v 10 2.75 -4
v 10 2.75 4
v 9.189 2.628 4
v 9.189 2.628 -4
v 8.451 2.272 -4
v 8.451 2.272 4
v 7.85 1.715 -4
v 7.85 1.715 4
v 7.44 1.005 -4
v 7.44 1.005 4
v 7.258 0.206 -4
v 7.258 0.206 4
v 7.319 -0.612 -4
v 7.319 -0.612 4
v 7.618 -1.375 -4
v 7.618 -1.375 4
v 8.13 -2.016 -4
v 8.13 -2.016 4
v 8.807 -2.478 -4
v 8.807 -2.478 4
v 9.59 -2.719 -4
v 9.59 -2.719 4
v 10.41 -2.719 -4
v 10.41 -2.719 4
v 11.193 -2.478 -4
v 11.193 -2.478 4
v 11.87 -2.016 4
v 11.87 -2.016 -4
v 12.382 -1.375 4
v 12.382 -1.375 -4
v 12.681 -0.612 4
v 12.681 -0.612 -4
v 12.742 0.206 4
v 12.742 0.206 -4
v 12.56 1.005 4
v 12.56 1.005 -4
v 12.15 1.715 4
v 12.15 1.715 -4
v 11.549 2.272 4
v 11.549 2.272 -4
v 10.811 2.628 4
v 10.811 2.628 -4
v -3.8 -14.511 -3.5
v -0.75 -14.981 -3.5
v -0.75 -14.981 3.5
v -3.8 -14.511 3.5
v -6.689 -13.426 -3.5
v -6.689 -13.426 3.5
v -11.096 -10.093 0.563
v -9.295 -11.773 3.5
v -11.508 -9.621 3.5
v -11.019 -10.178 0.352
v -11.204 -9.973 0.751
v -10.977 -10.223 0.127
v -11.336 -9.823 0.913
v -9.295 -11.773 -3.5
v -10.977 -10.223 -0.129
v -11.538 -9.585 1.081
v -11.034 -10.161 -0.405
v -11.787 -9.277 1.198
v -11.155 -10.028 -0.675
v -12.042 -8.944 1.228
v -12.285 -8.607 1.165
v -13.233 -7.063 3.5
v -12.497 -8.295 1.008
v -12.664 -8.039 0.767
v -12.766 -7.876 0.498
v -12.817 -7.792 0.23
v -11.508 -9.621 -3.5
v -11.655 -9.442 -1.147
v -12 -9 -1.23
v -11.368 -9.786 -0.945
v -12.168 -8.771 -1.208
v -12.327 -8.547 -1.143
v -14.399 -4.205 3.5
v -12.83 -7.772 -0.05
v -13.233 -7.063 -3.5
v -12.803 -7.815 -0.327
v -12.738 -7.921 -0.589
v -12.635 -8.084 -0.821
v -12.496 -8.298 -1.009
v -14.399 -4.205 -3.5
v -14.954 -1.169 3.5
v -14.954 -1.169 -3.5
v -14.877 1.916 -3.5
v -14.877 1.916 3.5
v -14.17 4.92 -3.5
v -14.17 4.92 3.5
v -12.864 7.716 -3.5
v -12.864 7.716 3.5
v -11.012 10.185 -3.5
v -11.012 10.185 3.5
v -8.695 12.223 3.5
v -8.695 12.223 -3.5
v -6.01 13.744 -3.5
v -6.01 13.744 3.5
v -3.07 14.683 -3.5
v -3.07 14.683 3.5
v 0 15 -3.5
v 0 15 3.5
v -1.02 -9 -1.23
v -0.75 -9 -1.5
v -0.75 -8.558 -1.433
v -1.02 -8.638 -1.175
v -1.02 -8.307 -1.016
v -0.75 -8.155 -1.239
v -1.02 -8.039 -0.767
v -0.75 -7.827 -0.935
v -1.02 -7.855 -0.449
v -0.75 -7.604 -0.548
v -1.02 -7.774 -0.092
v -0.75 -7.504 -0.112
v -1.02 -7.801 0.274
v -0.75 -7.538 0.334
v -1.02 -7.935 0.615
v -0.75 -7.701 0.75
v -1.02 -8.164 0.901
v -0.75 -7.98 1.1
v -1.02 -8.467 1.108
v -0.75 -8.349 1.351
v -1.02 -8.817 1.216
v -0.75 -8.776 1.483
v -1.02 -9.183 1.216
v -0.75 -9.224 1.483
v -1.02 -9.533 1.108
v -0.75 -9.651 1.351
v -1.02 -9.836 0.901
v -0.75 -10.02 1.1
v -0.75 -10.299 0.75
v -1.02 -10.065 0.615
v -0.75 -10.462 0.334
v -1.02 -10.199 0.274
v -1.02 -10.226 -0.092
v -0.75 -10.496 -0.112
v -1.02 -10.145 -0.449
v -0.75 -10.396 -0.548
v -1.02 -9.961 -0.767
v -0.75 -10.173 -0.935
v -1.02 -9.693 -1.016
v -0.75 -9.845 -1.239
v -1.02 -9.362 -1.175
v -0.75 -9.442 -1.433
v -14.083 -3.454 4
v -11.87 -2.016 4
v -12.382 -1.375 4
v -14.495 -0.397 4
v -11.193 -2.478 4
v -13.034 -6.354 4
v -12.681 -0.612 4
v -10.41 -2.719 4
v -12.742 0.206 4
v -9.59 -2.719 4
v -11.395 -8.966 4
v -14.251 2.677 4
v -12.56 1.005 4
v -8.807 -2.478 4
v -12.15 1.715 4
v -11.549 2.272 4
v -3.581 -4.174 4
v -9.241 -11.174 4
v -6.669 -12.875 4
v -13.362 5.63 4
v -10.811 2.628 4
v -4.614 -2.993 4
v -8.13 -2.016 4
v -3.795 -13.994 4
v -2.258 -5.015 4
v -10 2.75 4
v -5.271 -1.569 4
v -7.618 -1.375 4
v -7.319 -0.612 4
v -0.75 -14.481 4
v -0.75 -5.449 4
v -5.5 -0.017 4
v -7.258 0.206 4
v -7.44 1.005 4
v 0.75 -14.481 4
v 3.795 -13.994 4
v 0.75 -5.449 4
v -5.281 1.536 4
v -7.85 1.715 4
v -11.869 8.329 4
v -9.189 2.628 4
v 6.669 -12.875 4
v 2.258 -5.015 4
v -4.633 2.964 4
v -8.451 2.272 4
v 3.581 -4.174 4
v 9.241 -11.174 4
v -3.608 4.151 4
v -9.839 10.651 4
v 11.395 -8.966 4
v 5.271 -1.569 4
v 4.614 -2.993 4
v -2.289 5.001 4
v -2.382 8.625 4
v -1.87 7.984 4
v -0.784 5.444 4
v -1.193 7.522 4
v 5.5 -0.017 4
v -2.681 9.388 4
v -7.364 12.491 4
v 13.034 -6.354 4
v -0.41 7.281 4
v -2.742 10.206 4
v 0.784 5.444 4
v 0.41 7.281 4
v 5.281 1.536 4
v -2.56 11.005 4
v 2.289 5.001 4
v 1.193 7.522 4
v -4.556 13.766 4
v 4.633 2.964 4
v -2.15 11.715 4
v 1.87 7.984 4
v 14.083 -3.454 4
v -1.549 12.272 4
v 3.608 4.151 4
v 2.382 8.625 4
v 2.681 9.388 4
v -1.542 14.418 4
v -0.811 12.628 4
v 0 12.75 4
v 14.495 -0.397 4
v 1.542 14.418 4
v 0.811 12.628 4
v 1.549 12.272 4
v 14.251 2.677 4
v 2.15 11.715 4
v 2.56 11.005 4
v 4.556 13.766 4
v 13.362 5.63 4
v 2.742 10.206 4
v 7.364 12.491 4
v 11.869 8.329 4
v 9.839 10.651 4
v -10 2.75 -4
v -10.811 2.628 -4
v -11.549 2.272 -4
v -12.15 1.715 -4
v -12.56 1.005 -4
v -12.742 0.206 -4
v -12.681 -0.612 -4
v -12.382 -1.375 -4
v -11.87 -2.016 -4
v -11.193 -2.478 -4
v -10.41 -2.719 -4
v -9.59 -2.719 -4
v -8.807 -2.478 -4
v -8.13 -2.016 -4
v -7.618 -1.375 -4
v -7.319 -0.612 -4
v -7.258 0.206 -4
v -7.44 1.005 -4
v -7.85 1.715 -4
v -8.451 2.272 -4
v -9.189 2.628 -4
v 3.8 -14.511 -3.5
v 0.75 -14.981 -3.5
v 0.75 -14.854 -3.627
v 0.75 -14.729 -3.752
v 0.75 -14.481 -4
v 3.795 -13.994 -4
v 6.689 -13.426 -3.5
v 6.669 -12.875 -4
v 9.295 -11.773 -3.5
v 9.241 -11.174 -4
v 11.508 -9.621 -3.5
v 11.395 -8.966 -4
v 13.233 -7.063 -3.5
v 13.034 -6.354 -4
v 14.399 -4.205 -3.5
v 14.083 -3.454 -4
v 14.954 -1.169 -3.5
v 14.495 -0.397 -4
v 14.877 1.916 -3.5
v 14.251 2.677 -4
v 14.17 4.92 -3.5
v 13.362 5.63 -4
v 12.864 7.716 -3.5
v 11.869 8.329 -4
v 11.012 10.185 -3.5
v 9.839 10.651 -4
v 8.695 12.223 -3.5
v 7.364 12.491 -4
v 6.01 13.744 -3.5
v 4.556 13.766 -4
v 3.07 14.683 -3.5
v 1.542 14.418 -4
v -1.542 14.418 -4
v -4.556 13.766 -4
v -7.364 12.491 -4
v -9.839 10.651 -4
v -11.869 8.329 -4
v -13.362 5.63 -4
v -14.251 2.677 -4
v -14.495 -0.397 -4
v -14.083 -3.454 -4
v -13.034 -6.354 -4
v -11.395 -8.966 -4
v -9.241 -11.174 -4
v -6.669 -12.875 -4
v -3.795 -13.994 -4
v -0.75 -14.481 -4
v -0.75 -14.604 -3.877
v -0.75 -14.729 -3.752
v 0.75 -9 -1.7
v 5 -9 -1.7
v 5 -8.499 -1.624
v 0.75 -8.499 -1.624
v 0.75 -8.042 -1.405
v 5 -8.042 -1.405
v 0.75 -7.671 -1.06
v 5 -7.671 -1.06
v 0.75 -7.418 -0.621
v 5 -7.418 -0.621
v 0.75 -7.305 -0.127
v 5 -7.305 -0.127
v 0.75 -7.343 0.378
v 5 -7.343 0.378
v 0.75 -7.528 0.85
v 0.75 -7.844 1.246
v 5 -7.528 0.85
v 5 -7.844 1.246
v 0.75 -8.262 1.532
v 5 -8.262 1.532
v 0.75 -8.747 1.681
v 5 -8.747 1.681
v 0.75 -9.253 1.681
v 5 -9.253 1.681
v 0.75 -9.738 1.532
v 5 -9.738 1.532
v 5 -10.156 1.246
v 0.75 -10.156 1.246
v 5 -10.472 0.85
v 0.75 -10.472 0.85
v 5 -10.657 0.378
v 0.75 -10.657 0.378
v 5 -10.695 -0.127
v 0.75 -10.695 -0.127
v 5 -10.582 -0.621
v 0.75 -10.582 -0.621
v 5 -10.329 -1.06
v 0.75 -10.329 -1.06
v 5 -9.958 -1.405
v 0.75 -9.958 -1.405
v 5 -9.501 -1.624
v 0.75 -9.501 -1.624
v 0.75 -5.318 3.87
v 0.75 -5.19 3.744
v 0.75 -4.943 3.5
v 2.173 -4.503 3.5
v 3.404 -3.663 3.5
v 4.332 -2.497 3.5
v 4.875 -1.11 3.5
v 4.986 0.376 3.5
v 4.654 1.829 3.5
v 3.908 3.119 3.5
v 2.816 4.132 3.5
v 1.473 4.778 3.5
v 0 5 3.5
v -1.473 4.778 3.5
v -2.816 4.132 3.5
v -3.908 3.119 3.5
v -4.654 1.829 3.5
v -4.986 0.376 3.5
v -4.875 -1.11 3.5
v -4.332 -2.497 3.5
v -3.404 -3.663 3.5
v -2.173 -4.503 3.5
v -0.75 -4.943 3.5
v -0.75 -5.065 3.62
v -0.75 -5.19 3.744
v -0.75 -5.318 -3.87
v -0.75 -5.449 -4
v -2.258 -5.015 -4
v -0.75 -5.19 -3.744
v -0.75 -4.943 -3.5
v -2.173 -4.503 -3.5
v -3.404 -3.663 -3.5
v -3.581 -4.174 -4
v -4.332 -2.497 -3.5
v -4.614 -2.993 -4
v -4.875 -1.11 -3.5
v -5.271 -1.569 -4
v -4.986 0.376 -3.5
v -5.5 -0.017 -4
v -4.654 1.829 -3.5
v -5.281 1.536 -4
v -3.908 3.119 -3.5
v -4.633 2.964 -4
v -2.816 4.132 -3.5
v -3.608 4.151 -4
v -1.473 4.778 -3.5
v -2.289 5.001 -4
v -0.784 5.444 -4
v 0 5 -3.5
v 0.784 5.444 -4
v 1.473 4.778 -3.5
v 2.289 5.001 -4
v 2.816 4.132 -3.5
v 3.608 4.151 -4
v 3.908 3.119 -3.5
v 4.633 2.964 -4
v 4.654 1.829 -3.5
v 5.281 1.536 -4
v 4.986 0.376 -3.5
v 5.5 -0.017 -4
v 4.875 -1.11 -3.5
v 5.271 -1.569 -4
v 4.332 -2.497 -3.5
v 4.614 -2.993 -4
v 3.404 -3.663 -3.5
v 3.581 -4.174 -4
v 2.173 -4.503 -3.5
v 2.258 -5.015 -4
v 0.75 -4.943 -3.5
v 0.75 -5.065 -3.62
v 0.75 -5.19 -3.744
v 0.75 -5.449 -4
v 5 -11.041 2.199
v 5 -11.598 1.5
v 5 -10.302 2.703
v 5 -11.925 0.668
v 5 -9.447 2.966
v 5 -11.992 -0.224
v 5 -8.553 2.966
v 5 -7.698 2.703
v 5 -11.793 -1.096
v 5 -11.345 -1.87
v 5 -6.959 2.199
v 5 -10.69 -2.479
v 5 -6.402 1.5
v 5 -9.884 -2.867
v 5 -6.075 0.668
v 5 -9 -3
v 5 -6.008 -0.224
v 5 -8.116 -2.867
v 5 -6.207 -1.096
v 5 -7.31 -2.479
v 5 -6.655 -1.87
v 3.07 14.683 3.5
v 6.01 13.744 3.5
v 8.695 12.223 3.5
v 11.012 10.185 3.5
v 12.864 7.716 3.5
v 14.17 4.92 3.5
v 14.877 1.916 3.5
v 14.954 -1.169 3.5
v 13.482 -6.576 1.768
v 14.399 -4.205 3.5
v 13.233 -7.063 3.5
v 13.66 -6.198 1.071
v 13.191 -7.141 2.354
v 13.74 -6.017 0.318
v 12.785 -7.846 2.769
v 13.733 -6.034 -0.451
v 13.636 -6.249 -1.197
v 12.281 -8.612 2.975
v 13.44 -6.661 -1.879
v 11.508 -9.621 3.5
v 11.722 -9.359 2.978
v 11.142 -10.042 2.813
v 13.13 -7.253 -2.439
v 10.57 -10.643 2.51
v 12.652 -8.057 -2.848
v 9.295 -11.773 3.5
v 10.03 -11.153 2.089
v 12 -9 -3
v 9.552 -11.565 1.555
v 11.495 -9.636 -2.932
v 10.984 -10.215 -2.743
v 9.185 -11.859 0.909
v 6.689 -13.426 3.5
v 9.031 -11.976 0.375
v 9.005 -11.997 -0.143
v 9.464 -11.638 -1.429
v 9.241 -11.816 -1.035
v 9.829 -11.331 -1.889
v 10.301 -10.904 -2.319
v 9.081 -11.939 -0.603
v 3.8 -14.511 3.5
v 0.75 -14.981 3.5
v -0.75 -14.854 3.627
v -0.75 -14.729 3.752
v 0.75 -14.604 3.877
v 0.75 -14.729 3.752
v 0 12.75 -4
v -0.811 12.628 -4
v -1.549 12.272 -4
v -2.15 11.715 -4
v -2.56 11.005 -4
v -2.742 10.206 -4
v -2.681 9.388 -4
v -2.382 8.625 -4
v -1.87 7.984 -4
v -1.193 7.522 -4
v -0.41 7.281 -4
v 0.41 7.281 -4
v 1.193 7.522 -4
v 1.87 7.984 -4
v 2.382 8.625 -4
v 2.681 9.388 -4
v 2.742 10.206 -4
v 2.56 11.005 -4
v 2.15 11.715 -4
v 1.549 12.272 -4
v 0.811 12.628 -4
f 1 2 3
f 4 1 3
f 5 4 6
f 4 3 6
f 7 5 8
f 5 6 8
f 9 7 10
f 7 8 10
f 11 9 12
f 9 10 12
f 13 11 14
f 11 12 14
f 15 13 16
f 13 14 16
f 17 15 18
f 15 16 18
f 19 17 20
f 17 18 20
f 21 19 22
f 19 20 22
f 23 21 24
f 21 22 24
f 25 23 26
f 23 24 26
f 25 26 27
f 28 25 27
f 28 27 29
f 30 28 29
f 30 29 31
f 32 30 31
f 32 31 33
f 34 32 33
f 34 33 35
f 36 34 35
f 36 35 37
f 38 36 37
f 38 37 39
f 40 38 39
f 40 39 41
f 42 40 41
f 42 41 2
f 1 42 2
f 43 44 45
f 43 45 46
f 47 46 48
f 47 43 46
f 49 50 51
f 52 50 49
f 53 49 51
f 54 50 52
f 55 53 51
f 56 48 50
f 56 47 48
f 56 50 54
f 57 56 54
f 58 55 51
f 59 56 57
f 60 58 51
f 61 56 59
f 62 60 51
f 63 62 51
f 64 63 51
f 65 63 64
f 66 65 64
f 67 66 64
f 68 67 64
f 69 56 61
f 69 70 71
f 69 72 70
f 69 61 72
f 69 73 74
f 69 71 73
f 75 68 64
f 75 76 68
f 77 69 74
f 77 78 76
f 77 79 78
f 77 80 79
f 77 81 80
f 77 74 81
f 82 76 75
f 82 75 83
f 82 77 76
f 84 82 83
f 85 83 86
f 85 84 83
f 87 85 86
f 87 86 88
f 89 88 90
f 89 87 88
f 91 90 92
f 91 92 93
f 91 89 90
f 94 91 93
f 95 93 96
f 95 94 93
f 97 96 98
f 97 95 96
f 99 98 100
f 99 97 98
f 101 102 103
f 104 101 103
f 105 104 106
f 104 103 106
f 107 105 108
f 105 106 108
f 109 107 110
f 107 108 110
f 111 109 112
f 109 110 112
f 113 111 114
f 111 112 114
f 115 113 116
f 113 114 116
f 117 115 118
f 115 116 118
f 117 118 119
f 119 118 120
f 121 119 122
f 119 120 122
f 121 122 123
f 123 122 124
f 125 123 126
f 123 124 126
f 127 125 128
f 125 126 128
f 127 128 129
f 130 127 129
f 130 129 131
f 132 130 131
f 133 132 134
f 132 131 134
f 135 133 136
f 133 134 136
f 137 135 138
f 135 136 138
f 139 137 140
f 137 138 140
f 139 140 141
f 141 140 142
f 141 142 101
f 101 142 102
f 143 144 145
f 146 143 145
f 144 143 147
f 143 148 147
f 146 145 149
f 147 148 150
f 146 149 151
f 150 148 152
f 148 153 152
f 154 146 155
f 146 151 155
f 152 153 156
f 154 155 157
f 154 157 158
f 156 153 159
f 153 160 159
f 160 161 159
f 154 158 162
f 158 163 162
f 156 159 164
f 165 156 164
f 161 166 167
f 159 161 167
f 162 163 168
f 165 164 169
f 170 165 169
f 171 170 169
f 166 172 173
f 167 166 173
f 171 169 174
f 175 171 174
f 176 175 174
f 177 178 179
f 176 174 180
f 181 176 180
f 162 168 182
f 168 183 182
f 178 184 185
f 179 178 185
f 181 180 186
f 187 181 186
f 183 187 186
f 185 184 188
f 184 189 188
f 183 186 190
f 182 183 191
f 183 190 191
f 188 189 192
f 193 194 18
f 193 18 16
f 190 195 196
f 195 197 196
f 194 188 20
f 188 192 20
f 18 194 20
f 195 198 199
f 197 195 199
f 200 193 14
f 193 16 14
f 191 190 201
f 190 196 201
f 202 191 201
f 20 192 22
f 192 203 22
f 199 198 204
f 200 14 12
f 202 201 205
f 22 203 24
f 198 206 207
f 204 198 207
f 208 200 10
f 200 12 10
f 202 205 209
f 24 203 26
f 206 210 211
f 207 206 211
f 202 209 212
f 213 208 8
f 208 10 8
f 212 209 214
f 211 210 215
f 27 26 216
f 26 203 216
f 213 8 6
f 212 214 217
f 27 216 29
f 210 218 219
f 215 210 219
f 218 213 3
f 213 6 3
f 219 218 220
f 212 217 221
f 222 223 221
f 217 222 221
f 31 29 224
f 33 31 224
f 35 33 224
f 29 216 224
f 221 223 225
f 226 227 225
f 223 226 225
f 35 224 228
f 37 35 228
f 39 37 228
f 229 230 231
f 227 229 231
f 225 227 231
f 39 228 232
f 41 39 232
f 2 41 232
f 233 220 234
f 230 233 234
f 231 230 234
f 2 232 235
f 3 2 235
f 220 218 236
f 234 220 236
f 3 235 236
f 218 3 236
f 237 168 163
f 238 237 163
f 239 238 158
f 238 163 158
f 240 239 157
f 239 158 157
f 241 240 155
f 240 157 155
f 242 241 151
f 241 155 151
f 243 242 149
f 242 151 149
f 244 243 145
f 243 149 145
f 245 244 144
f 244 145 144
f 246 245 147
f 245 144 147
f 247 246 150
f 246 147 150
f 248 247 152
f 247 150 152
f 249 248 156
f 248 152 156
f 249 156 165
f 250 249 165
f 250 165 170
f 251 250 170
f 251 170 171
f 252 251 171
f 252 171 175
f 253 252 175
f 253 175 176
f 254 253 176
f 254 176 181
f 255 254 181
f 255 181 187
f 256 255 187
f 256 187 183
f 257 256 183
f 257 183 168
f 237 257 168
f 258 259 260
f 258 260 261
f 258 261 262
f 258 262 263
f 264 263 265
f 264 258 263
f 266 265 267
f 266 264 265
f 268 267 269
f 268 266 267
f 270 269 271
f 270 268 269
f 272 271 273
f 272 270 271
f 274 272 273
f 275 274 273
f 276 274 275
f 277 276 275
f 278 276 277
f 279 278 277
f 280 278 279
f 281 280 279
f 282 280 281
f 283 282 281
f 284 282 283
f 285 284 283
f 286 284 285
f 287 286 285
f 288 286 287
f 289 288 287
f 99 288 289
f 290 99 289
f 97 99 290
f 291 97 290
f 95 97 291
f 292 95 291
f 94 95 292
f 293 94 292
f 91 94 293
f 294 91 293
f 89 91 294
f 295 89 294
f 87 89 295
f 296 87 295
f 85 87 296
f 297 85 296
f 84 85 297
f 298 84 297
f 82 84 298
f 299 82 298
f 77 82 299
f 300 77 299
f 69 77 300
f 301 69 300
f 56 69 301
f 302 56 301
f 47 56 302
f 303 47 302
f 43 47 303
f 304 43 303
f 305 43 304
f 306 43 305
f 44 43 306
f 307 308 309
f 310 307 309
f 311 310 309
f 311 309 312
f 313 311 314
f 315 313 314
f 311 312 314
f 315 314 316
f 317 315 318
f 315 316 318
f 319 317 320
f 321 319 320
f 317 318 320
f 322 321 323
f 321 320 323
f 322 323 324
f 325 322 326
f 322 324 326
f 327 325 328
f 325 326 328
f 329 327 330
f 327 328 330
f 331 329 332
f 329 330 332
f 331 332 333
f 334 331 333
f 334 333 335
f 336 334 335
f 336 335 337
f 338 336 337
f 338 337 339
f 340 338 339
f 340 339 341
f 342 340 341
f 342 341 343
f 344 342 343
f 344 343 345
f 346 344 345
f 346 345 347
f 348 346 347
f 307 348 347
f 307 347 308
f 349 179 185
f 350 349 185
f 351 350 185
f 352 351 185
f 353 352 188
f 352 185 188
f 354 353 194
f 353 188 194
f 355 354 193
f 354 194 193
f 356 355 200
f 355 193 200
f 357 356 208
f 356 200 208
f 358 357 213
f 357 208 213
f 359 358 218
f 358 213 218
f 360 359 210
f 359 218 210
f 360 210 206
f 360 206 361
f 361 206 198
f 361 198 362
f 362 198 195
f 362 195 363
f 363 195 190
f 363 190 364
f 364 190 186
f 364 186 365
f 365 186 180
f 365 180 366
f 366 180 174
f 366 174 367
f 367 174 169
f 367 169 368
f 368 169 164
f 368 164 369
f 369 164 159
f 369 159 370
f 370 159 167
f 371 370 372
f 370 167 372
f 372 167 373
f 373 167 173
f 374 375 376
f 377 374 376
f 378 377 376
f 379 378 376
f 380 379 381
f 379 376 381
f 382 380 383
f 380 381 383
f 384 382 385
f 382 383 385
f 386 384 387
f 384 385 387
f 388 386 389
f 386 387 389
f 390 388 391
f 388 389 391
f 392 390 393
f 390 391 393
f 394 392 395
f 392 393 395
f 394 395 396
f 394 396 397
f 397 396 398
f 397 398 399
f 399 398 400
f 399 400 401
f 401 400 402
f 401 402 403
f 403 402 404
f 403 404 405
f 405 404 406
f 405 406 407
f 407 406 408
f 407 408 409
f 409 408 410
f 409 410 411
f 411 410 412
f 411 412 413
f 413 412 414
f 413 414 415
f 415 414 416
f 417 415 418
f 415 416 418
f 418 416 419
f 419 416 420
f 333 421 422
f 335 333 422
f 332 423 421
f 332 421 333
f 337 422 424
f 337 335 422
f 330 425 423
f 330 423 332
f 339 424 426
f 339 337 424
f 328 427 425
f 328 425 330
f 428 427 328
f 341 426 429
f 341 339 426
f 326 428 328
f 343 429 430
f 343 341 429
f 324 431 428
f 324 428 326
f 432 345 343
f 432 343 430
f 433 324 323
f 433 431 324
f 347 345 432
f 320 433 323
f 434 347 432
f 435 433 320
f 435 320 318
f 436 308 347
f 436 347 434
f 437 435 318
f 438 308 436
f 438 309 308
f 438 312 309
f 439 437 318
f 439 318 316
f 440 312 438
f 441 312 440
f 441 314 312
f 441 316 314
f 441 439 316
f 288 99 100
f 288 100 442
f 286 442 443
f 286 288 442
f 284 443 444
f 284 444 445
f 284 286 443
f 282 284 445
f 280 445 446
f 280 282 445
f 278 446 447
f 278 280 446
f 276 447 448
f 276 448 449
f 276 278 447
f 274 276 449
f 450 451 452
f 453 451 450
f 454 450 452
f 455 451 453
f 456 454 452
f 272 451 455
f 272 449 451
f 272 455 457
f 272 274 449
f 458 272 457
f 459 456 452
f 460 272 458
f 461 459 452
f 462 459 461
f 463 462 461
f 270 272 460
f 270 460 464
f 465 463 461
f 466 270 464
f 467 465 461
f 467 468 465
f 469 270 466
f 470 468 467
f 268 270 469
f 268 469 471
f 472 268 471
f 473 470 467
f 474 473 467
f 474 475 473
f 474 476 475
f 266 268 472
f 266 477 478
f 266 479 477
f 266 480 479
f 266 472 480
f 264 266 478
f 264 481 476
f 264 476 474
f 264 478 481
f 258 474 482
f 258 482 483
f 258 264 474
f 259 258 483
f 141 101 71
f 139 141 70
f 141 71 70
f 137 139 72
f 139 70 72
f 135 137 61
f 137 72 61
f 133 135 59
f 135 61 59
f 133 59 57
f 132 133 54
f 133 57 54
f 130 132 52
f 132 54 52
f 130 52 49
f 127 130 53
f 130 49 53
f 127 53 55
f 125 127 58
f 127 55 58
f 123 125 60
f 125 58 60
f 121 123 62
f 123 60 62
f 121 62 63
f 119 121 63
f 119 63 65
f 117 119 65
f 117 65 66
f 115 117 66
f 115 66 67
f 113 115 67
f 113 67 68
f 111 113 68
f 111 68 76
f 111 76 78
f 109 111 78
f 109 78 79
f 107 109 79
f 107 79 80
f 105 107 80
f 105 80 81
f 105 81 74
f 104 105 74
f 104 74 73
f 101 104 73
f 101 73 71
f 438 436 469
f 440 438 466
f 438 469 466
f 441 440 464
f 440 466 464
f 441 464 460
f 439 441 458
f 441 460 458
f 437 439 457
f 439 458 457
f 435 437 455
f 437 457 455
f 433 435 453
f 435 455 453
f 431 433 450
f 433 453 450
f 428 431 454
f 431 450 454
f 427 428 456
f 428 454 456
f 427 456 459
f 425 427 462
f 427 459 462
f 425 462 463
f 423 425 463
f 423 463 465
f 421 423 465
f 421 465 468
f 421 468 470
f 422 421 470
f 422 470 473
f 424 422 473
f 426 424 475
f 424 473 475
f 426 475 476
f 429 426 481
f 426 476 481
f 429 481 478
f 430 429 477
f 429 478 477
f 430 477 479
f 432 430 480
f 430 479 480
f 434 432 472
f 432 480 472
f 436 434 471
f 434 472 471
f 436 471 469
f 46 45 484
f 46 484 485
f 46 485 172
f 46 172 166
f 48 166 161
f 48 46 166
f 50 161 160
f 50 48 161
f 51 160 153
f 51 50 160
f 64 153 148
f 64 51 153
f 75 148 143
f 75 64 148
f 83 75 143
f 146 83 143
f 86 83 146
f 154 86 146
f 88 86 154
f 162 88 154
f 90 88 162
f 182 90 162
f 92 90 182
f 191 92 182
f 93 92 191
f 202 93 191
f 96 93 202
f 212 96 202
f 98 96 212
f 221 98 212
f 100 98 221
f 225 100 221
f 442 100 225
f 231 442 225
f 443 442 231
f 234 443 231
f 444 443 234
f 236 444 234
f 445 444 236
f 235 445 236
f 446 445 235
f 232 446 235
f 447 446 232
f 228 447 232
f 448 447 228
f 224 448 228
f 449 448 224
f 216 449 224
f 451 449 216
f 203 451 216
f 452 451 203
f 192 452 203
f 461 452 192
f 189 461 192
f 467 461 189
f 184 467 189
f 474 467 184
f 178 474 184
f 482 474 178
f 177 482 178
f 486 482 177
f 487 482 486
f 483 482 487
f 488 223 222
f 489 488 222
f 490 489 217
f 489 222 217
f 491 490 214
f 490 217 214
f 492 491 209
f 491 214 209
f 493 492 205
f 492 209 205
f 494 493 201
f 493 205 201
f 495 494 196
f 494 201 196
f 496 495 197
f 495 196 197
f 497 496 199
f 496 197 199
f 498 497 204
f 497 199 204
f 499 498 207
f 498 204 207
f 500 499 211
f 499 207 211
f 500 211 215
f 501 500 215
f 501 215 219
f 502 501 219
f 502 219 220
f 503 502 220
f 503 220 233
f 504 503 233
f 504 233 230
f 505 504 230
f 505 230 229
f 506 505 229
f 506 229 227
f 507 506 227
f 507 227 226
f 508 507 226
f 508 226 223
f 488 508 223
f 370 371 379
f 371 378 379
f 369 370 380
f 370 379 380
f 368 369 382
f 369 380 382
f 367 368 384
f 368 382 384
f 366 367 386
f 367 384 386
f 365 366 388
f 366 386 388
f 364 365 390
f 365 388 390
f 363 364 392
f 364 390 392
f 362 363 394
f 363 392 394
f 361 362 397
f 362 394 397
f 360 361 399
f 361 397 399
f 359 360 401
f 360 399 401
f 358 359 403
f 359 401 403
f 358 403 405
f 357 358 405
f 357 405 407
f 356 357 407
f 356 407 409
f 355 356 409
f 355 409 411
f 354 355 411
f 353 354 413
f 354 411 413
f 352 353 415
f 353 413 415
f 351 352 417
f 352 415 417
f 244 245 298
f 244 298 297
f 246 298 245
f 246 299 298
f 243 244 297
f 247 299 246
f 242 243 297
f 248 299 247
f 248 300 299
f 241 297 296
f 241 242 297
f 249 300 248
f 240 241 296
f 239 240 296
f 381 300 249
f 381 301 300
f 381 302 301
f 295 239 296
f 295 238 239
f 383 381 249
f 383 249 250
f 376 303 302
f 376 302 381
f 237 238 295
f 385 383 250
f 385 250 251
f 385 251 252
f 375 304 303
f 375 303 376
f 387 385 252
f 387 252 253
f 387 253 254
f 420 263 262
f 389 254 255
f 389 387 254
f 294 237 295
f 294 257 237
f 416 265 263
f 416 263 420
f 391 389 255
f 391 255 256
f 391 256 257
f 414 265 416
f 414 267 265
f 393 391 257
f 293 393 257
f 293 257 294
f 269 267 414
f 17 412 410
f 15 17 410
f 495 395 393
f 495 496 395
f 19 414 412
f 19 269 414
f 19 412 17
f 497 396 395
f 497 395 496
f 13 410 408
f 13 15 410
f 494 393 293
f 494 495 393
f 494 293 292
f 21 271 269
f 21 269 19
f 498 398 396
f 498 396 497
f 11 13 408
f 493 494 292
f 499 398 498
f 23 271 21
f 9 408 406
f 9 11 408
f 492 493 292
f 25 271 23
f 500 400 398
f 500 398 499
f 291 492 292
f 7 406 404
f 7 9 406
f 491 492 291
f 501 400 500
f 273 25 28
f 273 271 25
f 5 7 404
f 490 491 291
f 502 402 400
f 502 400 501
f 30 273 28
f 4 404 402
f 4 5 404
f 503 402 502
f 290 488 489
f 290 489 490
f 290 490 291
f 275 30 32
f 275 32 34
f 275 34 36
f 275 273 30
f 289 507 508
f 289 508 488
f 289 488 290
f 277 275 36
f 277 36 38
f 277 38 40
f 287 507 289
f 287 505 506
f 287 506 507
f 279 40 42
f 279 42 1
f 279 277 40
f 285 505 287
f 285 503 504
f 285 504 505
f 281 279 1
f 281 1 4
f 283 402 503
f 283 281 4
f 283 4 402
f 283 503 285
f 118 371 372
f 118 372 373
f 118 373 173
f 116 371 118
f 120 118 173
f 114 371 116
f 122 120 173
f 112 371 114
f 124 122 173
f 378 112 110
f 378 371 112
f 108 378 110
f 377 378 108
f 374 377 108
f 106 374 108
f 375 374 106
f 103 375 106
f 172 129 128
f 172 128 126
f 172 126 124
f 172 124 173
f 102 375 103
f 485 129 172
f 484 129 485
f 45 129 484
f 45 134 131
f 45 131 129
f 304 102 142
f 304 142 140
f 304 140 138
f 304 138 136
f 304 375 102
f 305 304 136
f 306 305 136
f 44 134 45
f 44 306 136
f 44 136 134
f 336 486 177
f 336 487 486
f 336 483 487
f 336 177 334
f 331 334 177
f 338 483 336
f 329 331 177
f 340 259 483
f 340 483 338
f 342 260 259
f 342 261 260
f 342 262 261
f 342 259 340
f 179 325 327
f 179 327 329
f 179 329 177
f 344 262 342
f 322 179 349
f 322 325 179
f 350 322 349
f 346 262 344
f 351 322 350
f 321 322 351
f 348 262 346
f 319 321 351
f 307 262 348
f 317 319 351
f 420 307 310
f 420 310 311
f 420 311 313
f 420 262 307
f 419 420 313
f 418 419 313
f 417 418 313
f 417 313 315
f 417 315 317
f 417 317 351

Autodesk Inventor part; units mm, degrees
sketch "Sketch_14" plane through (0, 0, 0) normal (1, 0, 0) x (0, 1, 0)
  line L0 (0, -4) -> (0, 4)
  line L1 (0, 4) -> (14.5, 4)
  line L2 (14.5, 4) -> (15, 3.5)
  line L3 (15, 3.5) -> (15, -3.5)
  line L4 (15, -3.5) -> (14.5, -4)
  line L5 (14.5, -4) -> (0, -4)
  line L6 (0, -4) -> (0, 4)
revolve "Revolution1" add sketch "Sketch_14" angle 360 about axis through (0, 0, -4) along (0, 0, -1)
sketch "Sketch_15" plane through (0, 0, 0) normal (1, 0, 0) x (0, 1, 0)
  line L0 (0, -4) -> (0, 4)
  line L1 (0, 4) -> (5.5, 4)
  line L2 (5.5, 4) -> (5, 3.5)
  line L3 (5, 3.5) -> (5, -3.5)
  line L4 (5, -3.5) -> (5.5, -4)
  line L5 (5.5, -4) -> (0, -4)
  line L6 (0, -4) -> (0, 4)
revolve "Revolution2" cut sketch "Sketch_15" angle 360 about axis through (0, 0, -4) along (0, 0, -1)
sketch "Sketch_16" plane through (0, 0, 0) normal (0, 0, 1) x (1, 0, 0)
  arc A0 (-0.75, -15.9824) -> (0.75, -15.9824) centre (0, 0) ccw
  line L0 (0.75, -15.9824) -> (0.75, 0)
  line L1 (0.75, 0) -> (-0.75, 0)
  line L2 (-0.75, 0) -> (-0.75, -15.9824)
extrude "Extrusion1" cut sketch "Sketch_16" along normal mid plane 8
sketch "Sketch4" plane through (0, 0, -4) normal (0, 0, -1) x (-1, 0, 0)
  point P0 (-10, 0)
hole "Hole1" at (10, 0, -4) direction (0, 0, 1) diameter 5.5 depth 8
sketch "Sketch5" plane through (0, 0, -4) normal (0, 0, -1) x (-1, 0, 0)
  point P0 (10, 0)
hole "Hole2" at (-10, 0, -4) direction (0, 0, 1) diameter 5.5 depth 8
sketch "Sketch6" plane through (0, 0, -4) normal (0, 0, -1) x (-1, 0, 0)
  point P0 (0, 10)
hole "Hole3" at (0, 10, -4) direction (0, 0, 1) diameter 5.5 depth 8
sketch "Sketch_23" plane through (0, -9, 0) normal (0, 1, 0) x (1, 0, 0)
  line L0 (15, 0) -> (0, 0)
  line L1 (0, 0) -> (0, 1.7)
  line L2 (0, 1.7) -> (5, 1.7)
  line L3 (5, 1.7) -> (5, 3)
  line L4 (5, 3) -> (15, 3)
  line L5 (15, 3) -> (15, 0)
  line L6 (15, 0) -> (0, 0)
revolve "Revolution3" cut sketch "Sketch_23" angle 360 about axis through (15, -9, 0) along (1, 0, 0)
sketch "Sketch8" plane through (-0.75, -14.4806, 4) normal (1, 0, 0) x (0, 0, -1)
  point P0 (4, 5.4806)
hole "Hole4" at (-0.75, -9, 0) direction (-1, 0, 0) diameter 2.459 depth 12.2404 countersink diameter 3 countersink angle 90 thread size "M3x0.5" class "6H" standard "ISO Metric profile"
ref_plane "to_bolt_XY" through (5, -9, 0) normal (1, 0, 0) x (0, 0, -1)
ref_plane "to_bolt_YZ" through (5, -9, 0) normal (0, 0, -1) x (0, 1, 0)
ref_plane "to_bolt_ZX" through (5, -9, 0) normal (0, 1, 0) x (1, 0, 0)
properties part number "SCST10-8b"
